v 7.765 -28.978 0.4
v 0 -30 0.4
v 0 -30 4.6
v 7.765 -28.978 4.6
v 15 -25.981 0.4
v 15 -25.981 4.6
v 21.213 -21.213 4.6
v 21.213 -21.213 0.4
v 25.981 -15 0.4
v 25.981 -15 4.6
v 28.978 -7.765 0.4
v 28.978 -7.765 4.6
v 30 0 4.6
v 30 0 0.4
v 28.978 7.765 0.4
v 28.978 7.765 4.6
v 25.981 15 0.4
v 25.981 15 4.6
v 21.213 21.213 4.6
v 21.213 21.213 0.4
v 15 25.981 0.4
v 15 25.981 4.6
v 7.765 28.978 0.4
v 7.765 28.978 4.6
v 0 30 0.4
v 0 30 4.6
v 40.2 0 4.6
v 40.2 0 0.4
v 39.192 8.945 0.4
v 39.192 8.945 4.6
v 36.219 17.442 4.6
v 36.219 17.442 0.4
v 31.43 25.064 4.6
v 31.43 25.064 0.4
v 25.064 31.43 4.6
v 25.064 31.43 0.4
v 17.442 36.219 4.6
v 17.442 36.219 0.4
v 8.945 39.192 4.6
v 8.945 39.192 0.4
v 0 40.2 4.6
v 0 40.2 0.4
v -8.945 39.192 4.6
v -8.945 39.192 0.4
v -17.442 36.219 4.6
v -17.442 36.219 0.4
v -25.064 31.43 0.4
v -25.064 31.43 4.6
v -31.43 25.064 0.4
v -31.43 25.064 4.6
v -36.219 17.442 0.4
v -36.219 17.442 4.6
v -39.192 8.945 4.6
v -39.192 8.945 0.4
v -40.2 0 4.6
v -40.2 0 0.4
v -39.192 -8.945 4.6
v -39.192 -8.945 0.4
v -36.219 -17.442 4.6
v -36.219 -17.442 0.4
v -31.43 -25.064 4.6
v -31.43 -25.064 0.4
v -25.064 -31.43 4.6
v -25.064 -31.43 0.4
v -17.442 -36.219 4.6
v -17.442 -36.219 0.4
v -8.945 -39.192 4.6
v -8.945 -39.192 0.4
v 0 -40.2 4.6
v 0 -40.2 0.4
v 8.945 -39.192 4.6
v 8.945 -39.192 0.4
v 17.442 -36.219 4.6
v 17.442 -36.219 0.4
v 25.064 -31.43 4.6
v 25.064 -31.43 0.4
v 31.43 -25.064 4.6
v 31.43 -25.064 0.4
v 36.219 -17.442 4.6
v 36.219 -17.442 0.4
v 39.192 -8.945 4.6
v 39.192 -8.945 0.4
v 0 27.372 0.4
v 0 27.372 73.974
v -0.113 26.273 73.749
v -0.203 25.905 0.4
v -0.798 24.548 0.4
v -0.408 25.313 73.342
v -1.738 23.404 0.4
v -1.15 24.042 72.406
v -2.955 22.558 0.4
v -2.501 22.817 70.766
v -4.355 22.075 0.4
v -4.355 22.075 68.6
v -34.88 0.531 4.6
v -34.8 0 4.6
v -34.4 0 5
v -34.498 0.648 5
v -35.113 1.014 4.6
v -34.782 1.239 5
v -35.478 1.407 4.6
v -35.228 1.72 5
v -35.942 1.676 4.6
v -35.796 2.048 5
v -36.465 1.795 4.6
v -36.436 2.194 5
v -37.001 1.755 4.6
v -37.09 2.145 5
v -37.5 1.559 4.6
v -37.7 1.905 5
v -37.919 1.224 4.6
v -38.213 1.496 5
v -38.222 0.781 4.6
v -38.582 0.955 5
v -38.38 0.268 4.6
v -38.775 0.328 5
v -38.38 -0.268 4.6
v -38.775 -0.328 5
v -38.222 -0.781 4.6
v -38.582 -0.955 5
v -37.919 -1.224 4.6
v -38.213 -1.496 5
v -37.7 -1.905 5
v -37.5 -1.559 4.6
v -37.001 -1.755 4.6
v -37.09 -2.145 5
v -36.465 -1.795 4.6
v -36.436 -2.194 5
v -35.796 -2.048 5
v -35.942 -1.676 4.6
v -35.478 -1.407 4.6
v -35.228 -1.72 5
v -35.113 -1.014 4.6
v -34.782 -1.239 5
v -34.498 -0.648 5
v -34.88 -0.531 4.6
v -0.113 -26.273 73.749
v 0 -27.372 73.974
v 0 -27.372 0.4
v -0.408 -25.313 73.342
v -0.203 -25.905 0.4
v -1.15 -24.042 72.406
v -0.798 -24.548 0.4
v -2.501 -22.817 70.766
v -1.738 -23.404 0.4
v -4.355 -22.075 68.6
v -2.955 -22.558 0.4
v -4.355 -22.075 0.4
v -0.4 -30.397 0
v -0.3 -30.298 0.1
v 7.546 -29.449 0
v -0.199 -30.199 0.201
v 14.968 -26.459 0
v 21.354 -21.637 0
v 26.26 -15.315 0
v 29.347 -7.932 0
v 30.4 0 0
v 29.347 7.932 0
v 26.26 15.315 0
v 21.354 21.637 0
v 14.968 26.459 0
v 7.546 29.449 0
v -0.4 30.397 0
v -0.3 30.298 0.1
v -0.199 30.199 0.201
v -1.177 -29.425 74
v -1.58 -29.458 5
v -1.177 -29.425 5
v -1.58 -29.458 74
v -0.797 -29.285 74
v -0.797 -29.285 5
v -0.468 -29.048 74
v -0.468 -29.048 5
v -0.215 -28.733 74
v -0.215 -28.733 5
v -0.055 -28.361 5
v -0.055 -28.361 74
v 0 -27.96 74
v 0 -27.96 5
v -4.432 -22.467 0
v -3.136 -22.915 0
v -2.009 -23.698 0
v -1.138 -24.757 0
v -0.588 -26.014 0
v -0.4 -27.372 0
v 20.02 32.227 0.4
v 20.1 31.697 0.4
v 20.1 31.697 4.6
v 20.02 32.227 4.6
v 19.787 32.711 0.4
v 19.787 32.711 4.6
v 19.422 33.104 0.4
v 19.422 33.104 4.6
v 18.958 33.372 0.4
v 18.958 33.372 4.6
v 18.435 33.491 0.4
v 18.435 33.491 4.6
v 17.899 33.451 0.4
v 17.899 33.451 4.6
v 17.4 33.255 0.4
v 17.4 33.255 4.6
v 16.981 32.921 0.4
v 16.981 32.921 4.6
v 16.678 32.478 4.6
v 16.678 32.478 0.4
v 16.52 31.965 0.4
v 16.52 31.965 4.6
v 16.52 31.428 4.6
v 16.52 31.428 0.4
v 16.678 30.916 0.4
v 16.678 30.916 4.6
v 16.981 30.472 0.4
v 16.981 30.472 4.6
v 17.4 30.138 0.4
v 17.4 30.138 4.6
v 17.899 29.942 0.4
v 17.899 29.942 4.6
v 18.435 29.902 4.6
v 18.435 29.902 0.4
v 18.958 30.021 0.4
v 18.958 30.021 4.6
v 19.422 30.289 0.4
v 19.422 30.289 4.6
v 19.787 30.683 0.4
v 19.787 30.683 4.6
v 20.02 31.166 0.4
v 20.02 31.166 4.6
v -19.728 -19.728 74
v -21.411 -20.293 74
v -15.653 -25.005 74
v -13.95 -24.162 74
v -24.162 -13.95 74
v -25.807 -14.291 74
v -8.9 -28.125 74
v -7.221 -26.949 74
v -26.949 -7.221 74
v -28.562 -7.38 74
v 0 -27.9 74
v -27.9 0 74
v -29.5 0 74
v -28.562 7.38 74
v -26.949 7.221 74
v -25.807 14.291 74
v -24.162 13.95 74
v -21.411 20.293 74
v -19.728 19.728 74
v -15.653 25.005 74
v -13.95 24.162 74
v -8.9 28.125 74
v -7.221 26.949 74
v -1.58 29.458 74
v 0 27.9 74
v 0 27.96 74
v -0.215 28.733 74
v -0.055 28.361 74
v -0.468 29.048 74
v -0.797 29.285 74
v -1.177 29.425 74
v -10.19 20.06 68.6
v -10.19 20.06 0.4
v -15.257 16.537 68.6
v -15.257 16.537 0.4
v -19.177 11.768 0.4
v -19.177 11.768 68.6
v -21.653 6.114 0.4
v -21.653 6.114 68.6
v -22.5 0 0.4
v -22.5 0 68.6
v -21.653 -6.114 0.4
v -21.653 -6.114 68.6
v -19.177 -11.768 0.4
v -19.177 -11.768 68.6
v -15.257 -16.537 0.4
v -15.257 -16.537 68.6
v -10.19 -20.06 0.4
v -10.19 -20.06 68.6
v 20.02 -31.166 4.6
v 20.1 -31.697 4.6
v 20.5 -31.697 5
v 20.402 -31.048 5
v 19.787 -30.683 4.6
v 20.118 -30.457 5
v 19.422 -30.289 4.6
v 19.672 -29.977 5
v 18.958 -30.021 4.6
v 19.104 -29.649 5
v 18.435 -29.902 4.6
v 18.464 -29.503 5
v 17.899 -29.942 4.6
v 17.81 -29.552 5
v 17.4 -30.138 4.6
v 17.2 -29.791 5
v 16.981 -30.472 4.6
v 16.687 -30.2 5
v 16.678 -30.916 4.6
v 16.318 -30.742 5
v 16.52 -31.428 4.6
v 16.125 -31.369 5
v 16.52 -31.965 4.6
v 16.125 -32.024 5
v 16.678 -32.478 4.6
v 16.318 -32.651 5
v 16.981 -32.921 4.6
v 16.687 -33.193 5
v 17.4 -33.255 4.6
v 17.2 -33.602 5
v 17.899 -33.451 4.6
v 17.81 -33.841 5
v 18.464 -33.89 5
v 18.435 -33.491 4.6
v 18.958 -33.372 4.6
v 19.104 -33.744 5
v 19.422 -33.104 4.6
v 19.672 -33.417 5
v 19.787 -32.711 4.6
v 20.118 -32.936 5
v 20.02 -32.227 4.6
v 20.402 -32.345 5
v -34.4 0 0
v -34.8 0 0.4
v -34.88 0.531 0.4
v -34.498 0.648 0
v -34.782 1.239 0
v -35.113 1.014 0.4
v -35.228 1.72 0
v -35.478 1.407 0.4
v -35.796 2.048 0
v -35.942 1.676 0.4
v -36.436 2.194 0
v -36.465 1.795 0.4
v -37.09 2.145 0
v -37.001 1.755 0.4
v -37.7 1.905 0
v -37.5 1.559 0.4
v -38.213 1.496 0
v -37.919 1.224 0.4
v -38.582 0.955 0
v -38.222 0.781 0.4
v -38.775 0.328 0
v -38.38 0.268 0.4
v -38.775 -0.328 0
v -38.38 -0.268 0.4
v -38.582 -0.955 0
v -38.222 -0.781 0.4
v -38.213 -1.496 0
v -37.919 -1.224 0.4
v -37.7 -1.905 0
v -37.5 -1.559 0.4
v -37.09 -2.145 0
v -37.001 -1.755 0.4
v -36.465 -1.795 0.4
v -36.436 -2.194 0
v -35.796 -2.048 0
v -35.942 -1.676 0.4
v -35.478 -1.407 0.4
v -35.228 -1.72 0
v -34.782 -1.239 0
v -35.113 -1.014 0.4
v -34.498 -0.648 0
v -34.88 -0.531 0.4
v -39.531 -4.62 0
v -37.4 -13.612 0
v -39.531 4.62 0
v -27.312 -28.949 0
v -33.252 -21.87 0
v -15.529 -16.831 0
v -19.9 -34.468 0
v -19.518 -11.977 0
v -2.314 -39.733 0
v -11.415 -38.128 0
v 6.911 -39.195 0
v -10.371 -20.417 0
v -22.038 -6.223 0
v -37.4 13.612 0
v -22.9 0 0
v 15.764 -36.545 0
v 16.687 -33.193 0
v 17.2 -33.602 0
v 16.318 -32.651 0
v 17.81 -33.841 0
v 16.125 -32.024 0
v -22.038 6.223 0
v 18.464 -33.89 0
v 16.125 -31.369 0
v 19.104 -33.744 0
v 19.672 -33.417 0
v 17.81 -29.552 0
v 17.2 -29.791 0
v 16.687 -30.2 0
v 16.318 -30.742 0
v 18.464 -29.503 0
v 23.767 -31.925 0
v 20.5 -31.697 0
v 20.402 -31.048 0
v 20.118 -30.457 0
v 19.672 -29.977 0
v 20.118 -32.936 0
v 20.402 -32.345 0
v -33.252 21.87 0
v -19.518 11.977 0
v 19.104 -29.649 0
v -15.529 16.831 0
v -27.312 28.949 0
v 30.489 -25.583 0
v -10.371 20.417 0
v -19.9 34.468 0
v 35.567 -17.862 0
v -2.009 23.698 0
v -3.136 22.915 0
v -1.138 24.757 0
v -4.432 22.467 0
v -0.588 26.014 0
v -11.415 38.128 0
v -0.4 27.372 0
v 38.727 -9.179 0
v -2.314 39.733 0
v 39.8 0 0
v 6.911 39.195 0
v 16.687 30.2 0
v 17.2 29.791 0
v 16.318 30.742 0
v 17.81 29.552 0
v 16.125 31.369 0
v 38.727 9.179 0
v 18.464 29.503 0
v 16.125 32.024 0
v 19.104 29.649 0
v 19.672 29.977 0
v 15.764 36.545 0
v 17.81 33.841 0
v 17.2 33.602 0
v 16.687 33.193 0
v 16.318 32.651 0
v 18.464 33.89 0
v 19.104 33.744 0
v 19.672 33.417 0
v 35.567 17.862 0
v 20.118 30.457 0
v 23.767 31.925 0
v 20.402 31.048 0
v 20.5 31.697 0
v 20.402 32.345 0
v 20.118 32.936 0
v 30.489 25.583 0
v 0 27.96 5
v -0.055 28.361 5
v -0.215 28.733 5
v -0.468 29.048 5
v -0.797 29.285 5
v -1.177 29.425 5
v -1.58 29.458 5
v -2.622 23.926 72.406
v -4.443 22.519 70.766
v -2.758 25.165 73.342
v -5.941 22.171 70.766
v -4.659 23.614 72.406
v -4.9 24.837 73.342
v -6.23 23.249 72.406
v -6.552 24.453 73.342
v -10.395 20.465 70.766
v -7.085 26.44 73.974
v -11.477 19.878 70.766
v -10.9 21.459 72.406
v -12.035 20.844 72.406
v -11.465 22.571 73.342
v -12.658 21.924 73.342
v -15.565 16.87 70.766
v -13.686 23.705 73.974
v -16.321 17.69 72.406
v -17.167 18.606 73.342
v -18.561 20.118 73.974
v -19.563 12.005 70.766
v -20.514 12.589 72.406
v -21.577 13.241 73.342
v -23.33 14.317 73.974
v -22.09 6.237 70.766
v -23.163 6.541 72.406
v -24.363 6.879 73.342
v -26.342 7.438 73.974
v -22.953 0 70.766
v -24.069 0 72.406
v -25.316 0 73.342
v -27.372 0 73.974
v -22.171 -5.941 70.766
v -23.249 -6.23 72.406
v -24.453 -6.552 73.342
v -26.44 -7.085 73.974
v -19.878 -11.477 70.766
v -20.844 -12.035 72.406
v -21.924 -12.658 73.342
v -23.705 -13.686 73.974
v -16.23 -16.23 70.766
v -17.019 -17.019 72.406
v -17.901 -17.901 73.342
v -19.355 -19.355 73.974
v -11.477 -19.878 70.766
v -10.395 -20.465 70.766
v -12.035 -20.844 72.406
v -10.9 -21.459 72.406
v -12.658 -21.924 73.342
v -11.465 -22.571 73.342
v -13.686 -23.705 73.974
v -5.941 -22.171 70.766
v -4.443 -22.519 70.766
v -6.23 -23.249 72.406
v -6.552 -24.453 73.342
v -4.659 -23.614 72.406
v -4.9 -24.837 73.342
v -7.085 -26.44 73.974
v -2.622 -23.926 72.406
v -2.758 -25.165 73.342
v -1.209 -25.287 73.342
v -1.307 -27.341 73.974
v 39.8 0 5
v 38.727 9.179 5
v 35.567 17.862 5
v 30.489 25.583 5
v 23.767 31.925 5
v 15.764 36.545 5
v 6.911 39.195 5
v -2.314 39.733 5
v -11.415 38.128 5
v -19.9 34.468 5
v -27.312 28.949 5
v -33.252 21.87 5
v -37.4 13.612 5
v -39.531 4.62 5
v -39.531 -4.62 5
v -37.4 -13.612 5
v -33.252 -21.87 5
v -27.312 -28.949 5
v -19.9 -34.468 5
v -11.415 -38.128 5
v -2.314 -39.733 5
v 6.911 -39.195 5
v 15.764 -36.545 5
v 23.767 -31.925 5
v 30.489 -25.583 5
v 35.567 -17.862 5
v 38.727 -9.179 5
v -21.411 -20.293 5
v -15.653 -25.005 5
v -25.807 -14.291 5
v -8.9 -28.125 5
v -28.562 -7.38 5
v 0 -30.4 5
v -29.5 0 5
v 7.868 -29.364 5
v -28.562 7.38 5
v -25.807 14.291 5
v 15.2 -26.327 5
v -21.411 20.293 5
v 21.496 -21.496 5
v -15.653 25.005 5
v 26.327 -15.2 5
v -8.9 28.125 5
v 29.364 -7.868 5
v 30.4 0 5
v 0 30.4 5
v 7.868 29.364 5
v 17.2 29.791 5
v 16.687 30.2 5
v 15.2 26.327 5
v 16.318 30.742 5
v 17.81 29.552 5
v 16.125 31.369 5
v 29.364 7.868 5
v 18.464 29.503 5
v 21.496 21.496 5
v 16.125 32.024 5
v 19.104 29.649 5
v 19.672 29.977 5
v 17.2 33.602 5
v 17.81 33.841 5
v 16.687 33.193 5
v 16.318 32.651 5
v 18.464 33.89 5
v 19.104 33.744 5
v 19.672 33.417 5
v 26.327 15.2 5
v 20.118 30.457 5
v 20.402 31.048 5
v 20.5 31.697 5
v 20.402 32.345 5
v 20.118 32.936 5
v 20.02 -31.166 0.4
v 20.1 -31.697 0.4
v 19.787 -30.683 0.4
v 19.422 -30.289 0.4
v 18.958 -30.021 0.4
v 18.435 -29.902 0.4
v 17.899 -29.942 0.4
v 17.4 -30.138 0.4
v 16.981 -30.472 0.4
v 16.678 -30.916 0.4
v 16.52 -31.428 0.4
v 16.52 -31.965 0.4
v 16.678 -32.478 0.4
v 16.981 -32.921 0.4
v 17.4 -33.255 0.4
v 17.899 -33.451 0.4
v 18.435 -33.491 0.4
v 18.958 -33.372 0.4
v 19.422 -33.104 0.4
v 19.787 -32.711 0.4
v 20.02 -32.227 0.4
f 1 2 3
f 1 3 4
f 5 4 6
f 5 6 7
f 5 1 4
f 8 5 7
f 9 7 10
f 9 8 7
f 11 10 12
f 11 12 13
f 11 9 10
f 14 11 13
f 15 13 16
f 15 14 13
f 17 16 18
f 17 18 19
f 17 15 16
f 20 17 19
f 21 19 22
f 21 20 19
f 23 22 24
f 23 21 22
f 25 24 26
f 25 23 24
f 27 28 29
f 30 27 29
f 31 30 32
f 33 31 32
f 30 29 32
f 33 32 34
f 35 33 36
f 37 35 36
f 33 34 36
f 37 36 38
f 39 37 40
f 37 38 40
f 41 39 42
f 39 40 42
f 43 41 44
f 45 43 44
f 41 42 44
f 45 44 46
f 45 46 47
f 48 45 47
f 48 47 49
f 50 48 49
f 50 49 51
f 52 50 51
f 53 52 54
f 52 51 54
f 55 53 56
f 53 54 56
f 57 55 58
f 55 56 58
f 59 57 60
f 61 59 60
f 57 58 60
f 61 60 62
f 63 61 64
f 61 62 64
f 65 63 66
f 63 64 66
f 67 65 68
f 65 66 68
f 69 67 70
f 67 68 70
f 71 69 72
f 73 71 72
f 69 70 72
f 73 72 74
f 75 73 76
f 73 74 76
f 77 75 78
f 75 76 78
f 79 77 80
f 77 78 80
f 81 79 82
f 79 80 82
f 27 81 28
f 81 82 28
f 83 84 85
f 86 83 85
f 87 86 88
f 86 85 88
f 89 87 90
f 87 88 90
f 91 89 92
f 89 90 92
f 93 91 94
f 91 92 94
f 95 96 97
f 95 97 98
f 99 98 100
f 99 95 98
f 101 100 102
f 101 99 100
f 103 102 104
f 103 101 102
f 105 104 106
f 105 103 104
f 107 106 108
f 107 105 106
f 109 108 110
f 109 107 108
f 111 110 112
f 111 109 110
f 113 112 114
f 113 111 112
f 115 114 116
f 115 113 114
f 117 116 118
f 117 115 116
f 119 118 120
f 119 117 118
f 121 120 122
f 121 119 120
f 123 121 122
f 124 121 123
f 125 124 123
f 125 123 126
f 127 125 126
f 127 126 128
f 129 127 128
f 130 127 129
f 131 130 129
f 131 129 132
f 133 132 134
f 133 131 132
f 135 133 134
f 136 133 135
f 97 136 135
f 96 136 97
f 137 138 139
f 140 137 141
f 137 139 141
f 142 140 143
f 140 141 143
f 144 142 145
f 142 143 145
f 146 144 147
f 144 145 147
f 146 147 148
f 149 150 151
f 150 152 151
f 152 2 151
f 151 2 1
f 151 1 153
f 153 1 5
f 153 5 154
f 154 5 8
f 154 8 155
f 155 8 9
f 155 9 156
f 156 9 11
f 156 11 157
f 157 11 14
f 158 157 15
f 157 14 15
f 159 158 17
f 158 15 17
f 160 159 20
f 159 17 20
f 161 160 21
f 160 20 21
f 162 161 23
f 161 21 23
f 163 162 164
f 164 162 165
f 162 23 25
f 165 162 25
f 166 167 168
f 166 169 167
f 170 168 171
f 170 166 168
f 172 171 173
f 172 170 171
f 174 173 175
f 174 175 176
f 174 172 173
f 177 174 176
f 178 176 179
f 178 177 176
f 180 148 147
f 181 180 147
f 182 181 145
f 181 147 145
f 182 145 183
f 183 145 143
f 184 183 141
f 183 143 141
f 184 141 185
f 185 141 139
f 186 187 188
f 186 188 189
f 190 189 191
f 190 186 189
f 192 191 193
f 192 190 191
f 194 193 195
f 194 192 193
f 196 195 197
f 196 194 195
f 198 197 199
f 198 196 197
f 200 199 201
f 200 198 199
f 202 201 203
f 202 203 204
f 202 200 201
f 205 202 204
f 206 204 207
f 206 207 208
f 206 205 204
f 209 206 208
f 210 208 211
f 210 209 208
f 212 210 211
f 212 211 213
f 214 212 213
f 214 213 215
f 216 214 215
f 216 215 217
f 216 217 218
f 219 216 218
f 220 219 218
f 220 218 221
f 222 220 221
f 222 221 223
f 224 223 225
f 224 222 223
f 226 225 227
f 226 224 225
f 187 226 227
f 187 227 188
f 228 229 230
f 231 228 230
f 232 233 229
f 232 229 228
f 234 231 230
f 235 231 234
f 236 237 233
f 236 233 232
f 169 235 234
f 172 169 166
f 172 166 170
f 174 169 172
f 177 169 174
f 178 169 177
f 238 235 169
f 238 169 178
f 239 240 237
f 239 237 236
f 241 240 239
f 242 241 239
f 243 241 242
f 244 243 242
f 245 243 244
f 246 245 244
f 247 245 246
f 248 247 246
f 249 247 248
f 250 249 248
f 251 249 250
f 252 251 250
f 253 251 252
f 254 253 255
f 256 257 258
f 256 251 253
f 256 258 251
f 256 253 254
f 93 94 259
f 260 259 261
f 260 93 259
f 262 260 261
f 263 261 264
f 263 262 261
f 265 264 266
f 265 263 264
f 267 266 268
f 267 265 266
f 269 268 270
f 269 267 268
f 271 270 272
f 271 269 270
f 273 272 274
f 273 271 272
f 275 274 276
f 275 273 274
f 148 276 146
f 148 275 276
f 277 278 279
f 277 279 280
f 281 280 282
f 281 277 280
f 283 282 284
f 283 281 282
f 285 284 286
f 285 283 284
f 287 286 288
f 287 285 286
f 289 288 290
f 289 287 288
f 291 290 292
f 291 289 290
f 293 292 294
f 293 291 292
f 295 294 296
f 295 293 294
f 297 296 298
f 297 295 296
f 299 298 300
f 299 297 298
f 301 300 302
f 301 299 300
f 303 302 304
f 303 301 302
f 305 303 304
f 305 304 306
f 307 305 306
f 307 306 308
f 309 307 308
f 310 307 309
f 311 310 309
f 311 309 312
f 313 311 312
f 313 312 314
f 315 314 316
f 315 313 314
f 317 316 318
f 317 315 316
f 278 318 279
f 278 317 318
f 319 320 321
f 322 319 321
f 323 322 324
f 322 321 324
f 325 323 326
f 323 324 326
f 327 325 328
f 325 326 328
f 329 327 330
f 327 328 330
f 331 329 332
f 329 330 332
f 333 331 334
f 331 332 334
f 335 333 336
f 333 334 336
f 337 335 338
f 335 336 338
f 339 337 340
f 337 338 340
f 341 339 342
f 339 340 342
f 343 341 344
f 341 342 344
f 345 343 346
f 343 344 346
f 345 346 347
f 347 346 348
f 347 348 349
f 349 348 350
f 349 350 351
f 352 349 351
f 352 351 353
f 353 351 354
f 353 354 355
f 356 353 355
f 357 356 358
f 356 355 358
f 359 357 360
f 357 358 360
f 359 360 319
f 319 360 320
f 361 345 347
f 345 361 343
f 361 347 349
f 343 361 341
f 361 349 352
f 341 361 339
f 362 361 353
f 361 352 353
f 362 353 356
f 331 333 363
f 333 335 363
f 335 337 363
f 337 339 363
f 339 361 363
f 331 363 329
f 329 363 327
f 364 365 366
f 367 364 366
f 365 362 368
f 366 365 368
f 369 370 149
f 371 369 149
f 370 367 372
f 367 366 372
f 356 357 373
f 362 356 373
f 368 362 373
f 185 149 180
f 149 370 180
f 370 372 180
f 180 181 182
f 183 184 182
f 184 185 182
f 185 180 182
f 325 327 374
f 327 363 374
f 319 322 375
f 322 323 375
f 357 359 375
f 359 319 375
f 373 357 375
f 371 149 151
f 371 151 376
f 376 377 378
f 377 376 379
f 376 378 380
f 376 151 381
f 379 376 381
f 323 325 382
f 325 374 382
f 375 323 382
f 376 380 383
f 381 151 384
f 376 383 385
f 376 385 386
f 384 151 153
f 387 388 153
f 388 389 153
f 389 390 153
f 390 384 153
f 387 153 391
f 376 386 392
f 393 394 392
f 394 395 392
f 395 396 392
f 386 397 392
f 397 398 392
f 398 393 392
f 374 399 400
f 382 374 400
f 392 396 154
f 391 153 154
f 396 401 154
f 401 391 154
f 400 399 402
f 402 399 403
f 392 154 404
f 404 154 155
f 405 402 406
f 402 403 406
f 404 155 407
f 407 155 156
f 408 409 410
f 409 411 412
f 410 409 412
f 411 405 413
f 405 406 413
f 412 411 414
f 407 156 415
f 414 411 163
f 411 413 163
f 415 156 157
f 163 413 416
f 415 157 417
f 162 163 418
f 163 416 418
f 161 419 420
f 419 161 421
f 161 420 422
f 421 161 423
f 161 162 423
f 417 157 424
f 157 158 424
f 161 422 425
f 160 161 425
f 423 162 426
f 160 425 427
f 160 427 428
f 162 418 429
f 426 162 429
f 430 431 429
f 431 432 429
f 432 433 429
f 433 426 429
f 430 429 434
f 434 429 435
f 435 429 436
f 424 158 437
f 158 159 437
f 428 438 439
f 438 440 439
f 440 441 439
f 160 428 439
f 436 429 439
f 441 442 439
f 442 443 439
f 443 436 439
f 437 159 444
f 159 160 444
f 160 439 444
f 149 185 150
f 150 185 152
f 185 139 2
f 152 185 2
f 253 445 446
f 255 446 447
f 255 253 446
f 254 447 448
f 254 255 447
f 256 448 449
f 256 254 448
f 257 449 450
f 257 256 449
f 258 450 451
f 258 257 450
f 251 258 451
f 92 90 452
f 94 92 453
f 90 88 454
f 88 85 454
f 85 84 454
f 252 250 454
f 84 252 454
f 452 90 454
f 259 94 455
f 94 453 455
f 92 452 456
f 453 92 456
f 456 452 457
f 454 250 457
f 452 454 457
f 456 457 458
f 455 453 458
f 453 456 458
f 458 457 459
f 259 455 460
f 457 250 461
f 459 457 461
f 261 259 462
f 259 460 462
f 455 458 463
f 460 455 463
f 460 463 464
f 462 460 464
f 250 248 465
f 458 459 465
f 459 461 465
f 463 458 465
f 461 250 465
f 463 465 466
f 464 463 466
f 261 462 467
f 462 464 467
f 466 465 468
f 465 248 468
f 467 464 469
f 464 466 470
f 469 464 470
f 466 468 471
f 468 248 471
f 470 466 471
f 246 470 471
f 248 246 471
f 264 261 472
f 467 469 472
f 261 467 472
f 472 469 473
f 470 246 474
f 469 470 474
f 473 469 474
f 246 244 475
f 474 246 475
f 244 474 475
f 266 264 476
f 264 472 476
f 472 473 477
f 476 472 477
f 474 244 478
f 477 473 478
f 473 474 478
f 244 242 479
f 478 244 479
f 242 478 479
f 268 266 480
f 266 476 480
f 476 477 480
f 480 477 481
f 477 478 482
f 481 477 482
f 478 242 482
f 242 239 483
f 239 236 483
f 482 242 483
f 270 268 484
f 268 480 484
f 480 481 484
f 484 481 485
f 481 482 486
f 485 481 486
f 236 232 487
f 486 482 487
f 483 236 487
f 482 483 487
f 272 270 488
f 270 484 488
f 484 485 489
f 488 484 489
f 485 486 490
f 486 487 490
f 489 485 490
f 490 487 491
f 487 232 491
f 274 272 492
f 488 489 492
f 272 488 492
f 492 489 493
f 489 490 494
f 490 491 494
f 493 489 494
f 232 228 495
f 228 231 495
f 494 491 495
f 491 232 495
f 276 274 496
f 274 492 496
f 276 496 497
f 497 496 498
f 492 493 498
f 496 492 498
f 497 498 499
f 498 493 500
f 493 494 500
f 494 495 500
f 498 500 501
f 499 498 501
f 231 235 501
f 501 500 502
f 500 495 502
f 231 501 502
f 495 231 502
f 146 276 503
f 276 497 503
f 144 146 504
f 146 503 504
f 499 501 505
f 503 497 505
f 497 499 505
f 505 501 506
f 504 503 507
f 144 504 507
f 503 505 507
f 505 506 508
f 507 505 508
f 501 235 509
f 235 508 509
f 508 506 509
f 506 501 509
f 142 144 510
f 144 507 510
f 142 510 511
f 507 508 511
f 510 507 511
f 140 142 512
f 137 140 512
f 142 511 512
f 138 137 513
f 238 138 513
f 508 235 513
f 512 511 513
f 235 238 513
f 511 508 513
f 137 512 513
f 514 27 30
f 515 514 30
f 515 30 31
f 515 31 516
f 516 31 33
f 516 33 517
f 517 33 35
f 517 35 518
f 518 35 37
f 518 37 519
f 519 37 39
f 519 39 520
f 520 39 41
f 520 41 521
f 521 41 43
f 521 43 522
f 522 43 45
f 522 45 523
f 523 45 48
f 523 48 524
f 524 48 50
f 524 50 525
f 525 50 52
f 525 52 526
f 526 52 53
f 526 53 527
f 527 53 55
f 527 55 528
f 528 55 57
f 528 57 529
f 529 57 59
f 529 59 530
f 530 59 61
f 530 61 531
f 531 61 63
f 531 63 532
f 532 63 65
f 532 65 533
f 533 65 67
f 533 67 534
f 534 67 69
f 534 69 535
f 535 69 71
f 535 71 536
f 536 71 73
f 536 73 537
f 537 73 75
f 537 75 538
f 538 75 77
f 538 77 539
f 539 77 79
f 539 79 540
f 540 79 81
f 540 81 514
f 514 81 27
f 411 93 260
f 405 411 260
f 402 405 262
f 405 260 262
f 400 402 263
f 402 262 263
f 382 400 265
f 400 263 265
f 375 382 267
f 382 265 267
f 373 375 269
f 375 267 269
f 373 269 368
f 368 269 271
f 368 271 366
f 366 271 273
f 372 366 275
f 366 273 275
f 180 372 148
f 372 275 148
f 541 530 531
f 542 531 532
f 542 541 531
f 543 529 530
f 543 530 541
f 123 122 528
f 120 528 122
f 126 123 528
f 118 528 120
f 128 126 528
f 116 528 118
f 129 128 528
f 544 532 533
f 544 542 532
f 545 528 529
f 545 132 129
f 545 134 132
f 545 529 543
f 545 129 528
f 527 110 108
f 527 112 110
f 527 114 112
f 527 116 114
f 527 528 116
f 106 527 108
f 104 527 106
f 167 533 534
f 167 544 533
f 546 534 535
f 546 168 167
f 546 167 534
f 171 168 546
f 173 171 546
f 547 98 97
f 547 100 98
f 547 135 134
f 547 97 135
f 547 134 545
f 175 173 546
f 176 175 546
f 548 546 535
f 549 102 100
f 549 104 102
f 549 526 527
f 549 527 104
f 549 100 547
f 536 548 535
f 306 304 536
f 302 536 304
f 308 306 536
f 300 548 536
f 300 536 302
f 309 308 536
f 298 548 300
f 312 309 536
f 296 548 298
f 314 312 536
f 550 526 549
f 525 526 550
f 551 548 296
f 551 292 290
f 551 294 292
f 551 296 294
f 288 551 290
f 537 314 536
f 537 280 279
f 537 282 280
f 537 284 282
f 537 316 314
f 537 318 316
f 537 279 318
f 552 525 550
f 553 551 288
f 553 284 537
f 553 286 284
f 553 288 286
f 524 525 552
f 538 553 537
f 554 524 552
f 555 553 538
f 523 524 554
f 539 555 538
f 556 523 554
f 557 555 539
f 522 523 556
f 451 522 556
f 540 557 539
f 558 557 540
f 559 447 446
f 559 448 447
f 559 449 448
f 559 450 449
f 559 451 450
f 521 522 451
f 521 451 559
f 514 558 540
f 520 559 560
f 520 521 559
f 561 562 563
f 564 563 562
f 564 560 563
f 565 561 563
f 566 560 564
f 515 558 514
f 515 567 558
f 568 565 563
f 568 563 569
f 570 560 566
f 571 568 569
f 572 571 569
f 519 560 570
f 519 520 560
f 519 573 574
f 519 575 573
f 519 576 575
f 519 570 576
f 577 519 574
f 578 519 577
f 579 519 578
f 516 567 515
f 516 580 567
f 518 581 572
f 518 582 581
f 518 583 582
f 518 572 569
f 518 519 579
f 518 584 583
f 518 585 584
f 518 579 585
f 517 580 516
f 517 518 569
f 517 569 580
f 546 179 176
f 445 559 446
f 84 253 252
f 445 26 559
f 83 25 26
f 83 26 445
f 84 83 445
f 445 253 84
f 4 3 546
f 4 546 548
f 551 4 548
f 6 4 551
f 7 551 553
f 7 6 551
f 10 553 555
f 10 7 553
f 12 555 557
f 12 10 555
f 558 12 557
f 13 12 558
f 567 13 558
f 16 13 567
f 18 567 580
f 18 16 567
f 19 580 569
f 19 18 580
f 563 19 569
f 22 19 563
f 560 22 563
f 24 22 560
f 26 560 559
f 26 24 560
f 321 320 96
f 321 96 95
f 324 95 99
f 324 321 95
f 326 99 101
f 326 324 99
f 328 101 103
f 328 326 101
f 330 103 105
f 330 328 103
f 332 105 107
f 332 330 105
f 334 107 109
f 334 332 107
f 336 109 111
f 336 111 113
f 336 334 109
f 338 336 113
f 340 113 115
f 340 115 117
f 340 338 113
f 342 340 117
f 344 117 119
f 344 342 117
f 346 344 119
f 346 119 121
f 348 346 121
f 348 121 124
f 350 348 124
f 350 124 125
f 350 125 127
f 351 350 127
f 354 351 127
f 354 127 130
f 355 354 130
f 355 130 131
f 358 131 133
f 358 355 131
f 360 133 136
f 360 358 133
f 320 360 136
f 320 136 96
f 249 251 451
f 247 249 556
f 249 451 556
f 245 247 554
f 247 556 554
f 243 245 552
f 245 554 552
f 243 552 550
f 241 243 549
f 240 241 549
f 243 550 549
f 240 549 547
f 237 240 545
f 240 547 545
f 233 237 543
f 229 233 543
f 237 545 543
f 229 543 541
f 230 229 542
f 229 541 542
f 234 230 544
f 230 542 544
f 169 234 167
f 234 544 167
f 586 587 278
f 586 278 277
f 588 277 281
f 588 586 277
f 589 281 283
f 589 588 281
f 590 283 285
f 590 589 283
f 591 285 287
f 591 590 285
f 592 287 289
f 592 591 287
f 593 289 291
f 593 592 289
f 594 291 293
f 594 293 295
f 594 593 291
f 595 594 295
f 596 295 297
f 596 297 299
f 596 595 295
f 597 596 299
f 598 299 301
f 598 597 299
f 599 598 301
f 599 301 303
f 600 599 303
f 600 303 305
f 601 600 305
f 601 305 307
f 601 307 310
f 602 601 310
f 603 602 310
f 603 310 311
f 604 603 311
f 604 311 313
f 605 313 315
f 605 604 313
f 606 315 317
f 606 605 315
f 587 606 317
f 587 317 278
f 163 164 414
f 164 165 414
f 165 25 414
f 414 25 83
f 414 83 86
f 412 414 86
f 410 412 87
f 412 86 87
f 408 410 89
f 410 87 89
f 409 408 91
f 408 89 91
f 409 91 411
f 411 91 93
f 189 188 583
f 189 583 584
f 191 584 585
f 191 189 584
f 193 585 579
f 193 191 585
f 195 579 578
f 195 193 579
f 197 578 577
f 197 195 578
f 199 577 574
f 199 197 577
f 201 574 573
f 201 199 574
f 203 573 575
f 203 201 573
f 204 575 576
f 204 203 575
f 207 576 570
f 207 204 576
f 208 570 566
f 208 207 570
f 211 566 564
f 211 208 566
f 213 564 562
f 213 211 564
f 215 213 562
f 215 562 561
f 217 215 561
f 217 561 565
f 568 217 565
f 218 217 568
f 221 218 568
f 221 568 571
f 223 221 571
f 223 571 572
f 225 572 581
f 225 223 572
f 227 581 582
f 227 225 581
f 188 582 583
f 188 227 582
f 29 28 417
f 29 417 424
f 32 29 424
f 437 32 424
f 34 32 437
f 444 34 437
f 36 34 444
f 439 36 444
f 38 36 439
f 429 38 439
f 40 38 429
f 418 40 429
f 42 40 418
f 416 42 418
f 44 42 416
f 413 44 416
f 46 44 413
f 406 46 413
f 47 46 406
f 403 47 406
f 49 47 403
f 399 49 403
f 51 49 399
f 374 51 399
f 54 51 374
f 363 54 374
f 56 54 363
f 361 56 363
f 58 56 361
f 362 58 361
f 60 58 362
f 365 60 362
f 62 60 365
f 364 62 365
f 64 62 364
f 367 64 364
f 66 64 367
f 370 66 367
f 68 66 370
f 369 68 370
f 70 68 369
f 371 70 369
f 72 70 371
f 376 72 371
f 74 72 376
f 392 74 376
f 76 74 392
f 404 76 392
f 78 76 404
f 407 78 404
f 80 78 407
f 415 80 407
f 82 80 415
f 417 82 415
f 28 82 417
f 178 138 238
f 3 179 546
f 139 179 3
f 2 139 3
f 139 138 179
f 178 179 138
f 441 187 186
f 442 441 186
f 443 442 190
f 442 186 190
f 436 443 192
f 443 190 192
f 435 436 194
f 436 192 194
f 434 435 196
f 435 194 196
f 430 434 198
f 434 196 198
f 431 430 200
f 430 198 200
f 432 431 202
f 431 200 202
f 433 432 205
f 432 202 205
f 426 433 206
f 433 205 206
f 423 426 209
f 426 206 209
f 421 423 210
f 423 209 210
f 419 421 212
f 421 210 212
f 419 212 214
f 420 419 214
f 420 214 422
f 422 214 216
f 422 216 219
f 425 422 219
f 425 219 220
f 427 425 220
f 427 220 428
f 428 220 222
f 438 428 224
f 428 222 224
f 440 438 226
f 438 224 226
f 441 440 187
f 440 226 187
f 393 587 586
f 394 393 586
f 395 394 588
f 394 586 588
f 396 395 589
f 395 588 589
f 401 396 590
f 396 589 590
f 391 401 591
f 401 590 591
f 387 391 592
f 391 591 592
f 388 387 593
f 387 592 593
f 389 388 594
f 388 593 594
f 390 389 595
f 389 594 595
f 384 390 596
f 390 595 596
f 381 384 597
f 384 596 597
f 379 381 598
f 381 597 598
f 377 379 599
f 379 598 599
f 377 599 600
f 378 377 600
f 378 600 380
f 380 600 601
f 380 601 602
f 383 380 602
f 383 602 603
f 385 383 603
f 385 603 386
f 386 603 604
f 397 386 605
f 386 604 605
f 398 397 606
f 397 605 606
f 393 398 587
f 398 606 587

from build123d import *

# Parameters (mm, degrees)
SKETCH_R     = 40.2
SKETCH_R_2   = 22.5
PAD_DEPTH    = 5
PAD001_DEPTH = 74
POCKET_DEPTH = 5
FILLET_R     = 1.5
FILLET001_R  = 5.4
SKETCH003_R  = 1.8
HOLE_DEPTH   = 5
CHAMFER_SIZE = 0.4


with BuildPart() as part:
    # Sketch → Pad (new body)
    with BuildSketch(Plane.XY):
        Circle(SKETCH_R)
        Circle(SKETCH_R_2, mode=Mode.SUBTRACT)
    extrude(amount=PAD_DEPTH)

    # Sketch001 → Pad001 (join)
    with BuildSketch(Plane.XY):
        with BuildLine():
            ThreePointArc((0, 29.5), (-29.5, 0), (0, -29.5))
            Line((0, -22.5), (0, -29.5))
            ThreePointArc((0, 22.5), (-22.5, 0), (0, -22.5))
            Line((0, 29.5), (0, 22.5))
        make_face()
    extrude(amount=PAD001_DEPTH)

    # Sketch002 → Pocket (cut)
    with BuildSketch(Plane.XY):
        with BuildLine():
            ThreePointArc((0, -30), (30, 0), (0, 30))
            Line((0, 30), (0, 22.5))
            ThreePointArc((0, -22.5), (22.5, 0), (0, 22.5))
            Line((0, -22.5), (0, -30))
        make_face()
    extrude(amount=POCKET_DEPTH, mode=Mode.SUBTRACT)

    # Fillet
    fillet_edges = [part.edges().sort_by_distance(p)[0] for p in [
        (0, -29.5, 39.5),
        (0, 29.5, 39.5),
    ]]
    fillet(fillet_edges, radius=FILLET_R)

    # Fillet001
    fillet001_edges = [part.edges().sort_by_distance(p)[0] for p in [
        (-22.5, 0, 74),
        (0, -22.5, 39.5),
        (0, 22.5, 39.5),
    ]]
    fillet(fillet001_edges, radius=FILLET001_R)

    # Sketch003 → Hole (cut)
    with BuildSketch(Plane.XY):
        with Locations((-36.6, 0)):
            Circle(SKETCH003_R)
        with Locations((18.3, 31.69653)):
            Circle(SKETCH003_R)
        with Locations((18.3, -31.69653)):
            Circle(SKETCH003_R)
    extrude(amount=HOLE_DEPTH, mode=Mode.SUBTRACT)

    # Chamfer
    chamfer_edges = [part.edges().sort_by_distance(p)[0] for p in [
        (-40.2, 0, 5),
        (20.1, -31.69653, 5),
        (20.1, 31.69653, 5),
        (30, 0, 5),
        (-40.2, 0, 0),
        (30, 0, 0),
        (20.1, -31.69653, 0),
        (20.1, 31.69653, 0),
        (-34.8, 0, 0),
        (0, -29.75, 0),
        (0, -28.436216, 0),
        (-1.228437, -23.943428, 0),
        (-22.5, 0, 0),
        (-1.228437, 23.943428, 0),
        (0, 29.75, 0),
        (0, 28.436216, 0),
        (-34.8, 0, 5),
    ]]
    chamfer(chamfer_edges, length=CHAMFER_SIZE)


solid = part.part
